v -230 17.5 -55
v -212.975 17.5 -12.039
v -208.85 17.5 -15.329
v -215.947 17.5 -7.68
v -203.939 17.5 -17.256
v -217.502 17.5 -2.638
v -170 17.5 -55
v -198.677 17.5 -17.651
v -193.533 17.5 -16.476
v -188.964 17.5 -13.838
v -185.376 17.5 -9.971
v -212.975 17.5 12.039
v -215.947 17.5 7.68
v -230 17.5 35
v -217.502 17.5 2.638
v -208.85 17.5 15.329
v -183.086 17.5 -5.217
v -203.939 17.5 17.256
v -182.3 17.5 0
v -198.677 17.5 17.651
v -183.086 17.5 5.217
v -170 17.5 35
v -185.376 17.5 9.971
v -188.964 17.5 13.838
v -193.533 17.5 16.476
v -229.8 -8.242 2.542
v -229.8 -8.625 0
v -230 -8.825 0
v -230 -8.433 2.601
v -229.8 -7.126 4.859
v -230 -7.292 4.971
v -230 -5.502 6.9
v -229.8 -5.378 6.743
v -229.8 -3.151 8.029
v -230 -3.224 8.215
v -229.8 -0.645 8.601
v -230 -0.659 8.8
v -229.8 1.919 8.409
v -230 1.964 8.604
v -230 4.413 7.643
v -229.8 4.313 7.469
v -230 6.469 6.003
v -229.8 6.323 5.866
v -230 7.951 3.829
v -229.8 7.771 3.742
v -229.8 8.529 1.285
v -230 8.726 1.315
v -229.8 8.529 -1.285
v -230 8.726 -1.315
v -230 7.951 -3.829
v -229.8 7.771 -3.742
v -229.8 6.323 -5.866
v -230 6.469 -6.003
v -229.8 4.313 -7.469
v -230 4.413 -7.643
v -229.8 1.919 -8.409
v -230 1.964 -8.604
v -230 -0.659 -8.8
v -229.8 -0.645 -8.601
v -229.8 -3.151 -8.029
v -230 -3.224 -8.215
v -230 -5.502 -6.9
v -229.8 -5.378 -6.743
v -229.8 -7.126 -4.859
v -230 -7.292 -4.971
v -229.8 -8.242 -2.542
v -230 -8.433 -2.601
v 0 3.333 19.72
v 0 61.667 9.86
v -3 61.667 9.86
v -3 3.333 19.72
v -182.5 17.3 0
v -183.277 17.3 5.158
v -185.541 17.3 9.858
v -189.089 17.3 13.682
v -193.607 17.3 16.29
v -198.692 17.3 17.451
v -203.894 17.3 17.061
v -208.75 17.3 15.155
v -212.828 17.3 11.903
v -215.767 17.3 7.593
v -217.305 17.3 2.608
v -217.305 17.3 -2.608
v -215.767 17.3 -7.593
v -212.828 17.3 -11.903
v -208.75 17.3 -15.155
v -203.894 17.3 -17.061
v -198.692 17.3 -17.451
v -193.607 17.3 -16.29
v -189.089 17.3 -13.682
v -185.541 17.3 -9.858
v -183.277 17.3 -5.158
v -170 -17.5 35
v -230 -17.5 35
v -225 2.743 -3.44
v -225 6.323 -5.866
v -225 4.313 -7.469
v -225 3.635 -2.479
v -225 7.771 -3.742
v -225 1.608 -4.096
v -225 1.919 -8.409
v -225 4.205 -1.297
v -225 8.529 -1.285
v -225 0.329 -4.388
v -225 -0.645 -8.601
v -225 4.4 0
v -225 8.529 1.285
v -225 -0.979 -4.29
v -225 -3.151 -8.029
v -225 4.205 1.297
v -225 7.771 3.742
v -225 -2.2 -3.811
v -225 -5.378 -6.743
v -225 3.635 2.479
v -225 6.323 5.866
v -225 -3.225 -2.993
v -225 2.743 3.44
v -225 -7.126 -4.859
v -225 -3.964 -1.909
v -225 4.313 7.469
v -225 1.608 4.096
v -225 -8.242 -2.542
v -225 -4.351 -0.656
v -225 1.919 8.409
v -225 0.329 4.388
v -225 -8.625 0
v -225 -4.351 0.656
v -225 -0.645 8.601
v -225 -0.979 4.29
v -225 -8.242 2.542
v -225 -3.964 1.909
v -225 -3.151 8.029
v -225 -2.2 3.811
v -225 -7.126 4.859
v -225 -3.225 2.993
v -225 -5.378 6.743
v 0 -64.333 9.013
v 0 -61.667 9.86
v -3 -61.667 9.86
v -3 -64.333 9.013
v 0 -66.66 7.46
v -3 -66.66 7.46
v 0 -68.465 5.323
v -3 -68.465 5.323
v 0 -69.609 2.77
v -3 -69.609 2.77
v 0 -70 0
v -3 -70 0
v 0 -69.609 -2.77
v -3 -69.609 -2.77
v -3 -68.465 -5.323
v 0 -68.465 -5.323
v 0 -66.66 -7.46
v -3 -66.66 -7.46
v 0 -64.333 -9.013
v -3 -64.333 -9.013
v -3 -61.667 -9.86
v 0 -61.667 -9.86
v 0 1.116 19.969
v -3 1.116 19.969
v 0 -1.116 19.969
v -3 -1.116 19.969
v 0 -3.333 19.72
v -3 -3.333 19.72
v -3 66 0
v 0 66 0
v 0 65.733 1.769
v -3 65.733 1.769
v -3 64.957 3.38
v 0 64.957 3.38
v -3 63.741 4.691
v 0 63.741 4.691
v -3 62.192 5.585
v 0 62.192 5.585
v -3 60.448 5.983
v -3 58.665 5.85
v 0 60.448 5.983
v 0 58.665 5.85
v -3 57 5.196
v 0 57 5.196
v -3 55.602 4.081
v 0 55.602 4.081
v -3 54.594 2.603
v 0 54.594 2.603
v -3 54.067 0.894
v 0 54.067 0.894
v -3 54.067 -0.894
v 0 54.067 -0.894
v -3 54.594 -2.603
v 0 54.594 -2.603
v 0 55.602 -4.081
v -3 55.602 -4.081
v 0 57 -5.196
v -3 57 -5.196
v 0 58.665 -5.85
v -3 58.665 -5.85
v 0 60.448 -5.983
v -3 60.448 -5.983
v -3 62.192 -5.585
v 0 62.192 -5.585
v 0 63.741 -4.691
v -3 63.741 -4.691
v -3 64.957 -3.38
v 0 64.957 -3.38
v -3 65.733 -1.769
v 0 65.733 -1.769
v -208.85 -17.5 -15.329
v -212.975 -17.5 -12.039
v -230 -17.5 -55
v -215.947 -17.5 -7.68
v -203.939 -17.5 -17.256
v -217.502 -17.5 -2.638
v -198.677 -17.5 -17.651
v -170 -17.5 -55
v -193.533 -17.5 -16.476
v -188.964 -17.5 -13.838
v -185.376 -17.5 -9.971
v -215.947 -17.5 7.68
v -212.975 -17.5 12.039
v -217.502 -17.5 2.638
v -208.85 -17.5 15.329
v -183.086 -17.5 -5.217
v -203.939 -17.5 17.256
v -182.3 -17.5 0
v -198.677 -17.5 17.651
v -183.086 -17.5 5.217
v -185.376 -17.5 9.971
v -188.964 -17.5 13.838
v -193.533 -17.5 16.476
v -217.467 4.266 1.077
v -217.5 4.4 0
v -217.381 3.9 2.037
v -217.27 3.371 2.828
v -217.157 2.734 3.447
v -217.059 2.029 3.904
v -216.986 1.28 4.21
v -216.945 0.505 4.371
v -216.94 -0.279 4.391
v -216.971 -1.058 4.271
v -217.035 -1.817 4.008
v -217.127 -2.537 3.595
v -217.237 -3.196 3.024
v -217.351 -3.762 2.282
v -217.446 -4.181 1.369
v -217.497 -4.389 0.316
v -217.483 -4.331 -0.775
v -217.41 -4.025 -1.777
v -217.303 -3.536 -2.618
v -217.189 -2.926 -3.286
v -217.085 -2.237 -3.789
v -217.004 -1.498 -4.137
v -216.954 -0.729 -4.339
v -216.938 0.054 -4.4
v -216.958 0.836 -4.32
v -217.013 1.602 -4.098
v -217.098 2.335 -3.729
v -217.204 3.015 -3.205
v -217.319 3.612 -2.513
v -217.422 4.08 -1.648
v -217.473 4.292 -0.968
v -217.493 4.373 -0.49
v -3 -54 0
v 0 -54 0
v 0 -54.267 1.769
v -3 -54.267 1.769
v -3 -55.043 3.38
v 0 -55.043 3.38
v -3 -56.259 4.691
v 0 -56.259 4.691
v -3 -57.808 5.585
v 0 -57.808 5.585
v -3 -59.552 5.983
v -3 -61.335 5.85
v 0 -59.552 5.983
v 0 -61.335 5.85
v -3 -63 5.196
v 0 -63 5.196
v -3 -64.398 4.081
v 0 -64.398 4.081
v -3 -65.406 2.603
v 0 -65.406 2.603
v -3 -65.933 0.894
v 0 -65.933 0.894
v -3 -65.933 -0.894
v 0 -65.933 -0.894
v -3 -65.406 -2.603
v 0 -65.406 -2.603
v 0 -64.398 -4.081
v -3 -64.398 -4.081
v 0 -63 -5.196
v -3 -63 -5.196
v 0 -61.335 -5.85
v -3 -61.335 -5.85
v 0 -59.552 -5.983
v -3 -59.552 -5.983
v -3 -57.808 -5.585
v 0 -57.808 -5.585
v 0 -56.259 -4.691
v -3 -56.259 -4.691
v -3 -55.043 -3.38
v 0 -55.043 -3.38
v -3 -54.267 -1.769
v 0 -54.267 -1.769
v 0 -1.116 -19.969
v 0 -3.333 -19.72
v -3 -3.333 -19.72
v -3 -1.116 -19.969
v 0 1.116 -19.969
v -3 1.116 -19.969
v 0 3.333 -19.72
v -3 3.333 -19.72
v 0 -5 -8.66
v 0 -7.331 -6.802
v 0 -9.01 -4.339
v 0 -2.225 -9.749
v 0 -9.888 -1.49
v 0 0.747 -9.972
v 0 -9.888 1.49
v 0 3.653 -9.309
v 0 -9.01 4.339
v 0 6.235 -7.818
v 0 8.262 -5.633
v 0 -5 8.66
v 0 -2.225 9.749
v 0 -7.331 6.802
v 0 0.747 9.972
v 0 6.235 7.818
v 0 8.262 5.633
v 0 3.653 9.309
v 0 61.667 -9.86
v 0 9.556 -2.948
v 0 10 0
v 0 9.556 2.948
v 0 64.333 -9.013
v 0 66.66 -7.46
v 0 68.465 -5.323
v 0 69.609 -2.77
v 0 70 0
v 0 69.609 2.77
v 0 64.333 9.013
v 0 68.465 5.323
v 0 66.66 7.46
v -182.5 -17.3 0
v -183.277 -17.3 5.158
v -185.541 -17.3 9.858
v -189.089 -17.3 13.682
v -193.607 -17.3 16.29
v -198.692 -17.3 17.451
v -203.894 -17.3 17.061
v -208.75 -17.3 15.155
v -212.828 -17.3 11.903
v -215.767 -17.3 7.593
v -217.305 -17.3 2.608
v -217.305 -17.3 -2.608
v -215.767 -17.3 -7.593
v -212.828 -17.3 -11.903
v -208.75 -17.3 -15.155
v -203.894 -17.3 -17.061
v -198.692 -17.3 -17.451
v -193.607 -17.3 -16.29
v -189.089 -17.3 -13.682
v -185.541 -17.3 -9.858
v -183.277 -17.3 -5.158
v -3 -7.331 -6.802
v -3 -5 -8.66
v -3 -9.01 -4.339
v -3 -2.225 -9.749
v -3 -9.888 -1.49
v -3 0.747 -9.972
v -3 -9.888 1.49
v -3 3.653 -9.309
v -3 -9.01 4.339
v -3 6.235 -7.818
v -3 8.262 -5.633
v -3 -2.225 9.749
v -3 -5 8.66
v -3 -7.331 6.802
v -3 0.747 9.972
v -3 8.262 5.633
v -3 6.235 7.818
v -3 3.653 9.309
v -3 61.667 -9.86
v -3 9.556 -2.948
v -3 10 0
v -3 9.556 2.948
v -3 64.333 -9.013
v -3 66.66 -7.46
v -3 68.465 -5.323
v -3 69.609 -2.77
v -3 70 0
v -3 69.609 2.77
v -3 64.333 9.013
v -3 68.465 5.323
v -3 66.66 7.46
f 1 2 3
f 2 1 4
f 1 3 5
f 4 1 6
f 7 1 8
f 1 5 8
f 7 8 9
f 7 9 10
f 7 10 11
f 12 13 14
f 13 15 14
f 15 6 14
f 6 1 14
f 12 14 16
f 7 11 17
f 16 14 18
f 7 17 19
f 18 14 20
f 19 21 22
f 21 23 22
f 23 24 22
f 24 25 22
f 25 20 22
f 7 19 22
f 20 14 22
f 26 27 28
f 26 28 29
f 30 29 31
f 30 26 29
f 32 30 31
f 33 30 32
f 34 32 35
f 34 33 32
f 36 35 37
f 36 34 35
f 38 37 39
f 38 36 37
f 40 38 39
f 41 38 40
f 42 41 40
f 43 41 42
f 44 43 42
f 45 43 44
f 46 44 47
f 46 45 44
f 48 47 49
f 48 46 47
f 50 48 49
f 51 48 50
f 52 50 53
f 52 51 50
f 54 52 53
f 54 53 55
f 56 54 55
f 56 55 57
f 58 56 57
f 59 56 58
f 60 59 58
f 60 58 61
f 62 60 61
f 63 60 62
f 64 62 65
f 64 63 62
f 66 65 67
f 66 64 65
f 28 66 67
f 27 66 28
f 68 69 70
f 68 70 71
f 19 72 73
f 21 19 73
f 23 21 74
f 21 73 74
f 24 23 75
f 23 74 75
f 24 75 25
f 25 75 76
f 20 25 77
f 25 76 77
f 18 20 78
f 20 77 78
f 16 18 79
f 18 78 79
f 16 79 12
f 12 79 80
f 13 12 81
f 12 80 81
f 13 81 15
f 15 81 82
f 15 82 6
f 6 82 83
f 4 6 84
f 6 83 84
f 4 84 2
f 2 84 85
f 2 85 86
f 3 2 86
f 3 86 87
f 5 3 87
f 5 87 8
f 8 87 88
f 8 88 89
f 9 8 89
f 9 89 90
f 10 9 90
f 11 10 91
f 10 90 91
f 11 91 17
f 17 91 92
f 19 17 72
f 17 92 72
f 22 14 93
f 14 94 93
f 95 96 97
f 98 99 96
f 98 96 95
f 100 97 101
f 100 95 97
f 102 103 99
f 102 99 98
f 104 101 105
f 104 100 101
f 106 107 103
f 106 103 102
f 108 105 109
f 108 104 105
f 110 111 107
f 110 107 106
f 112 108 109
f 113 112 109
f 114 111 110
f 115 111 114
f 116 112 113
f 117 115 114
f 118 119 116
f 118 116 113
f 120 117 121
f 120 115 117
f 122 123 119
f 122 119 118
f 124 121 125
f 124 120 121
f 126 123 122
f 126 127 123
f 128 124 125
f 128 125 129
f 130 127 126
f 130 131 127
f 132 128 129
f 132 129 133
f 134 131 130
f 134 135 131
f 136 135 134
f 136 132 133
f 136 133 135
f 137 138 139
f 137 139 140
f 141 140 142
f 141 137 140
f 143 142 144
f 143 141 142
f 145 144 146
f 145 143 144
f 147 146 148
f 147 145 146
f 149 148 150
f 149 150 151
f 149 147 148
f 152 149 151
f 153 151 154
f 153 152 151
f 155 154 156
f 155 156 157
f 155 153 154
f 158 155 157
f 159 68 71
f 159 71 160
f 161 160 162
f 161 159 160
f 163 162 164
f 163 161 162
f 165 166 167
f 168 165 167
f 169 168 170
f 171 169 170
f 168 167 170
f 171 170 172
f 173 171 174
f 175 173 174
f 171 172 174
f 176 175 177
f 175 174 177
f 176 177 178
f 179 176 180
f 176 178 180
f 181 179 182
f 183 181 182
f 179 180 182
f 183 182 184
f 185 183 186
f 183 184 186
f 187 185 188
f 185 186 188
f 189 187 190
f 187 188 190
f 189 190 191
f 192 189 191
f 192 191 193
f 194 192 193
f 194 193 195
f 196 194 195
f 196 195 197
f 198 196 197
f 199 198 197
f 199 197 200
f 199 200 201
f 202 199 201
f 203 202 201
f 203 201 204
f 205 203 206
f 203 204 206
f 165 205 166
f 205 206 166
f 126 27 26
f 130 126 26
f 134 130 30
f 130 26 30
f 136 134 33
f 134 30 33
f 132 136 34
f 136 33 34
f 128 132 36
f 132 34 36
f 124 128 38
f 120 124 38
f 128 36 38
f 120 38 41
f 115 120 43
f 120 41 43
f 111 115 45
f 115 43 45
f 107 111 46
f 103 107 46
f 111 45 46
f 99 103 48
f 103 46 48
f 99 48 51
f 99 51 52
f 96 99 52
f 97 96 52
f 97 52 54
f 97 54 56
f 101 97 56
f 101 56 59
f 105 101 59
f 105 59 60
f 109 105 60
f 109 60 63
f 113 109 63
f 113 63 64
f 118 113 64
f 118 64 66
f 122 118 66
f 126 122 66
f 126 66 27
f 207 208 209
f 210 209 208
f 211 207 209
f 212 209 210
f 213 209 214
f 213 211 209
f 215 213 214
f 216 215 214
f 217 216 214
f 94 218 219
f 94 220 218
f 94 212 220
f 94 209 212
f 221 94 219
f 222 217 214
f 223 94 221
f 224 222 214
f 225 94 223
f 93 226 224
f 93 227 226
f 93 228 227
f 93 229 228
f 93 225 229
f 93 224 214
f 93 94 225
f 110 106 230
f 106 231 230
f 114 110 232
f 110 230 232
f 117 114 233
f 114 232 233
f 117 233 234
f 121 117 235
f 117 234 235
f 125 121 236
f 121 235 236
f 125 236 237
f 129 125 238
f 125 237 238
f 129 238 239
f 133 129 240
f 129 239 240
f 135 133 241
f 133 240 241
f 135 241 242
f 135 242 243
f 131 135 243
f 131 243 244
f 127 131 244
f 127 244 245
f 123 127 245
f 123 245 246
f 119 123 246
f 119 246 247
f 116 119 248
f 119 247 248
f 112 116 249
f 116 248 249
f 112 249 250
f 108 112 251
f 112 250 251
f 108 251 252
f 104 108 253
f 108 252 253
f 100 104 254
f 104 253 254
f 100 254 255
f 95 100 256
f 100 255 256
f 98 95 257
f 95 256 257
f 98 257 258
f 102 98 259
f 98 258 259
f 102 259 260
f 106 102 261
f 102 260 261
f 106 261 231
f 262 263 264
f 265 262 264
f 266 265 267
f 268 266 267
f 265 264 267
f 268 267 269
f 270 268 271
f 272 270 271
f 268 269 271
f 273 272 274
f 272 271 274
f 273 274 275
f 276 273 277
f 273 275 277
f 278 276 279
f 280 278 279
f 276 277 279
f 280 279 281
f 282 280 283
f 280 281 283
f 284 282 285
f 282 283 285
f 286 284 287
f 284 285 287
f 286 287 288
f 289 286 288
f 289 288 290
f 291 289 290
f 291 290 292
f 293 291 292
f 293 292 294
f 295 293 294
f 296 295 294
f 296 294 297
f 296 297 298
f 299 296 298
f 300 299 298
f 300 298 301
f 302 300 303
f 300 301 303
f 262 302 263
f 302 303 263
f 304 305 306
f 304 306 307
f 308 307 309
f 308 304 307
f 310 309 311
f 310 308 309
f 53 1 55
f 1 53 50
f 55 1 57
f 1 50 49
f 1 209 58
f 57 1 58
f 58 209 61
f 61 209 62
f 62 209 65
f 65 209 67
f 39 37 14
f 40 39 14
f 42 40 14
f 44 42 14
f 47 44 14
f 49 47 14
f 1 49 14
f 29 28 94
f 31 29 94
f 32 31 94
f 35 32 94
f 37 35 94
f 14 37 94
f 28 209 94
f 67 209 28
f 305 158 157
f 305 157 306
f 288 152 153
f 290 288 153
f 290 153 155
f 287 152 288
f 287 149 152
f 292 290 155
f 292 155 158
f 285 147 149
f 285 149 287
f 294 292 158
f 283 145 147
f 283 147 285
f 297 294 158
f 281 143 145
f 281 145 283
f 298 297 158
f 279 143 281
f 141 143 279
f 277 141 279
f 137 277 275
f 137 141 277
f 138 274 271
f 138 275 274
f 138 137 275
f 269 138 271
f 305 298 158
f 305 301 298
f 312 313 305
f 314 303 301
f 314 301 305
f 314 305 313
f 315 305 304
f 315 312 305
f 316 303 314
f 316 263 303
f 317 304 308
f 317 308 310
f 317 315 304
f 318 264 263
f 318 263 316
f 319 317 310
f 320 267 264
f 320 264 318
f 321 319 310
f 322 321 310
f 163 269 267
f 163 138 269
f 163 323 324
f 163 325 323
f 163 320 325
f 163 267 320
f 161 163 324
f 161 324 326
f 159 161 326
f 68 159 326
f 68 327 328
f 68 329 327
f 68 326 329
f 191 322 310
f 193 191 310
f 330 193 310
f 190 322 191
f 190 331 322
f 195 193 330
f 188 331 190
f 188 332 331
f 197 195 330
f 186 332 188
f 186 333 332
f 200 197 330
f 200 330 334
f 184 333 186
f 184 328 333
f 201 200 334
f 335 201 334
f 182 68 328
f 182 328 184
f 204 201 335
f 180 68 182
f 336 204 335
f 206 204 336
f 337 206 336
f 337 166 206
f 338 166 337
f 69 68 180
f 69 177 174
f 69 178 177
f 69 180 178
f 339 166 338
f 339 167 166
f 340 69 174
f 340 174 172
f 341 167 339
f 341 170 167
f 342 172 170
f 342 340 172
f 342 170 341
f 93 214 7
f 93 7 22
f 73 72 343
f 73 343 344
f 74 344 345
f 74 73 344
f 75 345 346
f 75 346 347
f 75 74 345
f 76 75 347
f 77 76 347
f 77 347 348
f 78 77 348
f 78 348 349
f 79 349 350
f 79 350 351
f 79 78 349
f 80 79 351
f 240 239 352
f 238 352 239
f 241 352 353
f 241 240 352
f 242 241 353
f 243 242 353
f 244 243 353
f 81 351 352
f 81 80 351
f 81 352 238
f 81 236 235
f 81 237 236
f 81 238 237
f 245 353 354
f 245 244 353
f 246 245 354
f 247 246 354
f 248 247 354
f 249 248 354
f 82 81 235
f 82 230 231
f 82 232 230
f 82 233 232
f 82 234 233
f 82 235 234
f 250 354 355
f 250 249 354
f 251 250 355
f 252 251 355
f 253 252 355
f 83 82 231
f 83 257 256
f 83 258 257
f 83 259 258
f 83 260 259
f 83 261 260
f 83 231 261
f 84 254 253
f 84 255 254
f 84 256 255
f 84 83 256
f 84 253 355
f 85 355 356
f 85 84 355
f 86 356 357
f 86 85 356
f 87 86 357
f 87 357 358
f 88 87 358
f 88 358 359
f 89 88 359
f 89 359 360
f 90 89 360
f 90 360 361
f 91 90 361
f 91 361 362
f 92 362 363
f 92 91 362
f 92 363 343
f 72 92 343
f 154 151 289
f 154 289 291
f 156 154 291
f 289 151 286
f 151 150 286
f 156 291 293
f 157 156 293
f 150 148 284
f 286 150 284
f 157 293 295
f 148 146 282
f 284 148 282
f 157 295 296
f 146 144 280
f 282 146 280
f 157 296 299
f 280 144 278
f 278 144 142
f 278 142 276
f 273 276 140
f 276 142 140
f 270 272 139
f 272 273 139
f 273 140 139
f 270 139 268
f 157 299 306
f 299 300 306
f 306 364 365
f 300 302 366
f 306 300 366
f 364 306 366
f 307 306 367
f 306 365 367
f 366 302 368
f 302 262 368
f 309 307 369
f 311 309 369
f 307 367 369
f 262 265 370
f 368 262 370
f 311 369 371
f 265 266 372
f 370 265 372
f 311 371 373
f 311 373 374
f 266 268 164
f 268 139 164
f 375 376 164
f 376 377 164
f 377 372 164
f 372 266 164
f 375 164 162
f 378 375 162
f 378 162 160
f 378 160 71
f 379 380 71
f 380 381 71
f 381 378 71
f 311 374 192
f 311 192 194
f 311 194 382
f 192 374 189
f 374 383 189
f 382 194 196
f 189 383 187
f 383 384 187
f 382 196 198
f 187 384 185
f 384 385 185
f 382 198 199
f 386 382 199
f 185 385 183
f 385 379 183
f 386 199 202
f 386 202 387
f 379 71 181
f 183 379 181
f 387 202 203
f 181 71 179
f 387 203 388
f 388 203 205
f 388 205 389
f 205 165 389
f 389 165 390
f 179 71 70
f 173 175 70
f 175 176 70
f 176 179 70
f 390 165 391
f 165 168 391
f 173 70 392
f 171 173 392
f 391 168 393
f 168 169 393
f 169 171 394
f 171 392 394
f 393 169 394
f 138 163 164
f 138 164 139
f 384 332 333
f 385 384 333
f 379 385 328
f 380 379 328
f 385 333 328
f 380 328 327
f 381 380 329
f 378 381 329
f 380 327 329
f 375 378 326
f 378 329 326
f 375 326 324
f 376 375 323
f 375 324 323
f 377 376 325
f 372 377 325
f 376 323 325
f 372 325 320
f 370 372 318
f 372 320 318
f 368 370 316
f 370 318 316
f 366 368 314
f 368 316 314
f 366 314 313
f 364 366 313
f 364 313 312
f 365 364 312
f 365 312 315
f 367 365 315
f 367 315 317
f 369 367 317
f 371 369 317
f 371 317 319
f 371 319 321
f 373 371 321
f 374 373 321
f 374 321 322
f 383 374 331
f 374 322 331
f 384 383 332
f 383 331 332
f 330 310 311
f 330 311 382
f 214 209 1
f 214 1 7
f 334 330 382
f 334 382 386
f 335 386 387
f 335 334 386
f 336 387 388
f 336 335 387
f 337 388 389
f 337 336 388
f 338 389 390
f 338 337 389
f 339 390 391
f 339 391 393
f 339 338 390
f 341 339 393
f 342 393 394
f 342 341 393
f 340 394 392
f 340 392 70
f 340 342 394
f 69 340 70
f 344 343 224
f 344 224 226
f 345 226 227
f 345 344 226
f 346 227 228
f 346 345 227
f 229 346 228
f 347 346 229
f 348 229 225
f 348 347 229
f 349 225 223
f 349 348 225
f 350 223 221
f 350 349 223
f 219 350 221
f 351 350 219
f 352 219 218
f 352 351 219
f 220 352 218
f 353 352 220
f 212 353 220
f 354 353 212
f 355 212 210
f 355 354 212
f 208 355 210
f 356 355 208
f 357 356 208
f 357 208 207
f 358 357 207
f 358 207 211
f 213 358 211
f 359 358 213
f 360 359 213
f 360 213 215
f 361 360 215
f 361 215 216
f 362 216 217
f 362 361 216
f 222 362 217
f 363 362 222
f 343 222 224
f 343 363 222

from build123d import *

# Parameters (mm, degrees)
F0_W           = 60
F0_H           = 90
F0_R           = 17.5
F1_DEPTH       = 17.5
F3_D           = 8.8
F3_DEPTH       = 15
F3_CBORE_D     = 17.25
F3_CBORE_DEPTH = 5
F3_TIP         = 2.6437867237
F4_SIZE        = 0.2
F5_R           = 6
F5_R_2         = 10
F6_DEPTH       = 3


with BuildPart() as f1:
    # F0 (on Front) → F1 (new body, symmetric)
    with BuildSketch(Plane.XZ):
        with Locations((-200, -10)):
            Rectangle(F0_W, F0_H)
        with Locations((-200, 0)):
            Circle(F0_R, mode=Mode.SUBTRACT)
    extrude(amount=F1_DEPTH, both=True)

    # F3
    with Locations(Plane(origin=(-230, 0, 0), x_dir=(0, -1, 0), z_dir=(-1, 0, 0))):
        with Locations((0, 0)):
            CounterBoreHole(F3_D / 2, F3_CBORE_D / 2, F3_CBORE_DEPTH, depth=F3_DEPTH)
            with Locations((0, 0, -(F3_DEPTH + F3_TIP / 2))):  # 118° drill point
                Cone(0, F3_D / 2, F3_TIP, mode=Mode.SUBTRACT)

    # F4
    f4_edges = [f1.edges().sort_by_distance(p)[0] for p in [
        (-217.5, -17.5, 0),
        (-217.5, 17.5, 0),
        (-230, 8.625, 0),
    ]]
    chamfer(f4_edges, length=F4_SIZE)


with BuildPart() as f6:
    # F5 (on Right) → F6 (new body)
    with BuildSketch(Plane.YZ):
        with BuildLine():
            Line((61.6666666667, 9.8601329718), (3.3333333333, 19.7202659437))
            ThreePointArc((3.3333333333, 19.7202659437), (0, 20), (-3.3333333333, 19.7202659437))
            Line((-3.3333333333, 19.7202659437), (-61.6666666667, 9.8601329718))
            ThreePointArc((-61.6666666667, 9.8601329718), (-70, 0), (-61.6666666667, -9.8601329718))
            Line((-61.6666666667, -9.8601329718), (-3.3333333333, -19.7202659437))
            ThreePointArc((-3.3333333333, -19.7202659437), (0, -20), (3.3333333333, -19.7202659437))
            Line((3.3333333333, -19.7202659437), (61.6666666667, -9.8601329718))
            ThreePointArc((61.6666666667, -9.8601329718), (70, 0), (61.6666666667, 9.8601329718))
        make_face()
        with Locations((-60, 0)):
            Circle(F5_R, mode=Mode.SUBTRACT)
        Circle(F5_R_2, mode=Mode.SUBTRACT)
        with Locations((60, 0)):
            Circle(F5_R, mode=Mode.SUBTRACT)
    extrude(amount=-F6_DEPTH)


solid = Compound([f1.part, f6.part])
